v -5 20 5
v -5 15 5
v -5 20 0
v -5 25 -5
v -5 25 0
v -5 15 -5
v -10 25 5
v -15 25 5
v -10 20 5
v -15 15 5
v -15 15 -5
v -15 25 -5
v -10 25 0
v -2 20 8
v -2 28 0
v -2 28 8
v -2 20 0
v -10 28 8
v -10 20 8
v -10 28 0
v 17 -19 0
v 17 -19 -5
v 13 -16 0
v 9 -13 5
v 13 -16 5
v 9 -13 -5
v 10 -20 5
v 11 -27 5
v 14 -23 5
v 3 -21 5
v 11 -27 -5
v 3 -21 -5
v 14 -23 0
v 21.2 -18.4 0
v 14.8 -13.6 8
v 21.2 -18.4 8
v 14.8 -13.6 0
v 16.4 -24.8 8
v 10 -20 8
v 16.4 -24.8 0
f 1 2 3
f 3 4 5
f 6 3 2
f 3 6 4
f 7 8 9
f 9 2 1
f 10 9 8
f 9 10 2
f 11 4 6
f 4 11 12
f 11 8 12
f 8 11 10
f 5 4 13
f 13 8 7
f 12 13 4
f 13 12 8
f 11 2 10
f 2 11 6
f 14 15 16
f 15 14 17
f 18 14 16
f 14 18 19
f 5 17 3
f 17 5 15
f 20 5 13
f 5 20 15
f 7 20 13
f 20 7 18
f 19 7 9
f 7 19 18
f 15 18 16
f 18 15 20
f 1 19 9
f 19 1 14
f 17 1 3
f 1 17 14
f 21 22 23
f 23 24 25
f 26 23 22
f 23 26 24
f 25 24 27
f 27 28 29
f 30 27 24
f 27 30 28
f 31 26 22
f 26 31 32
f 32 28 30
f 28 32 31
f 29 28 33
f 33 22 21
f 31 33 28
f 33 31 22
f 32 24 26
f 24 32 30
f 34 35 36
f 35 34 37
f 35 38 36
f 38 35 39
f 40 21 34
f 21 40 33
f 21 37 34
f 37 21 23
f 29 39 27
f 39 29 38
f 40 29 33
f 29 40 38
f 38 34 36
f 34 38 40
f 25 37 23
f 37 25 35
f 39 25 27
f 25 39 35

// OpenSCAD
// ### Usage #########################################################
translate_and_mirror([-10, 20, 0]) {
  cube([10, 10, 10], center = true);
  cube(8);
}


// ### Module ########################################################
// dims - distance to translate object and repel mirrored object
// m - scaling factor for mirror to invert dimensions
module translate_and_mirror(dims, m = [1, 1, 1]) {
  // Object
  translate(dims)
  children();
  // Mirror
  translate(-1 * dims)
  mirror(dims)
  children();
}
